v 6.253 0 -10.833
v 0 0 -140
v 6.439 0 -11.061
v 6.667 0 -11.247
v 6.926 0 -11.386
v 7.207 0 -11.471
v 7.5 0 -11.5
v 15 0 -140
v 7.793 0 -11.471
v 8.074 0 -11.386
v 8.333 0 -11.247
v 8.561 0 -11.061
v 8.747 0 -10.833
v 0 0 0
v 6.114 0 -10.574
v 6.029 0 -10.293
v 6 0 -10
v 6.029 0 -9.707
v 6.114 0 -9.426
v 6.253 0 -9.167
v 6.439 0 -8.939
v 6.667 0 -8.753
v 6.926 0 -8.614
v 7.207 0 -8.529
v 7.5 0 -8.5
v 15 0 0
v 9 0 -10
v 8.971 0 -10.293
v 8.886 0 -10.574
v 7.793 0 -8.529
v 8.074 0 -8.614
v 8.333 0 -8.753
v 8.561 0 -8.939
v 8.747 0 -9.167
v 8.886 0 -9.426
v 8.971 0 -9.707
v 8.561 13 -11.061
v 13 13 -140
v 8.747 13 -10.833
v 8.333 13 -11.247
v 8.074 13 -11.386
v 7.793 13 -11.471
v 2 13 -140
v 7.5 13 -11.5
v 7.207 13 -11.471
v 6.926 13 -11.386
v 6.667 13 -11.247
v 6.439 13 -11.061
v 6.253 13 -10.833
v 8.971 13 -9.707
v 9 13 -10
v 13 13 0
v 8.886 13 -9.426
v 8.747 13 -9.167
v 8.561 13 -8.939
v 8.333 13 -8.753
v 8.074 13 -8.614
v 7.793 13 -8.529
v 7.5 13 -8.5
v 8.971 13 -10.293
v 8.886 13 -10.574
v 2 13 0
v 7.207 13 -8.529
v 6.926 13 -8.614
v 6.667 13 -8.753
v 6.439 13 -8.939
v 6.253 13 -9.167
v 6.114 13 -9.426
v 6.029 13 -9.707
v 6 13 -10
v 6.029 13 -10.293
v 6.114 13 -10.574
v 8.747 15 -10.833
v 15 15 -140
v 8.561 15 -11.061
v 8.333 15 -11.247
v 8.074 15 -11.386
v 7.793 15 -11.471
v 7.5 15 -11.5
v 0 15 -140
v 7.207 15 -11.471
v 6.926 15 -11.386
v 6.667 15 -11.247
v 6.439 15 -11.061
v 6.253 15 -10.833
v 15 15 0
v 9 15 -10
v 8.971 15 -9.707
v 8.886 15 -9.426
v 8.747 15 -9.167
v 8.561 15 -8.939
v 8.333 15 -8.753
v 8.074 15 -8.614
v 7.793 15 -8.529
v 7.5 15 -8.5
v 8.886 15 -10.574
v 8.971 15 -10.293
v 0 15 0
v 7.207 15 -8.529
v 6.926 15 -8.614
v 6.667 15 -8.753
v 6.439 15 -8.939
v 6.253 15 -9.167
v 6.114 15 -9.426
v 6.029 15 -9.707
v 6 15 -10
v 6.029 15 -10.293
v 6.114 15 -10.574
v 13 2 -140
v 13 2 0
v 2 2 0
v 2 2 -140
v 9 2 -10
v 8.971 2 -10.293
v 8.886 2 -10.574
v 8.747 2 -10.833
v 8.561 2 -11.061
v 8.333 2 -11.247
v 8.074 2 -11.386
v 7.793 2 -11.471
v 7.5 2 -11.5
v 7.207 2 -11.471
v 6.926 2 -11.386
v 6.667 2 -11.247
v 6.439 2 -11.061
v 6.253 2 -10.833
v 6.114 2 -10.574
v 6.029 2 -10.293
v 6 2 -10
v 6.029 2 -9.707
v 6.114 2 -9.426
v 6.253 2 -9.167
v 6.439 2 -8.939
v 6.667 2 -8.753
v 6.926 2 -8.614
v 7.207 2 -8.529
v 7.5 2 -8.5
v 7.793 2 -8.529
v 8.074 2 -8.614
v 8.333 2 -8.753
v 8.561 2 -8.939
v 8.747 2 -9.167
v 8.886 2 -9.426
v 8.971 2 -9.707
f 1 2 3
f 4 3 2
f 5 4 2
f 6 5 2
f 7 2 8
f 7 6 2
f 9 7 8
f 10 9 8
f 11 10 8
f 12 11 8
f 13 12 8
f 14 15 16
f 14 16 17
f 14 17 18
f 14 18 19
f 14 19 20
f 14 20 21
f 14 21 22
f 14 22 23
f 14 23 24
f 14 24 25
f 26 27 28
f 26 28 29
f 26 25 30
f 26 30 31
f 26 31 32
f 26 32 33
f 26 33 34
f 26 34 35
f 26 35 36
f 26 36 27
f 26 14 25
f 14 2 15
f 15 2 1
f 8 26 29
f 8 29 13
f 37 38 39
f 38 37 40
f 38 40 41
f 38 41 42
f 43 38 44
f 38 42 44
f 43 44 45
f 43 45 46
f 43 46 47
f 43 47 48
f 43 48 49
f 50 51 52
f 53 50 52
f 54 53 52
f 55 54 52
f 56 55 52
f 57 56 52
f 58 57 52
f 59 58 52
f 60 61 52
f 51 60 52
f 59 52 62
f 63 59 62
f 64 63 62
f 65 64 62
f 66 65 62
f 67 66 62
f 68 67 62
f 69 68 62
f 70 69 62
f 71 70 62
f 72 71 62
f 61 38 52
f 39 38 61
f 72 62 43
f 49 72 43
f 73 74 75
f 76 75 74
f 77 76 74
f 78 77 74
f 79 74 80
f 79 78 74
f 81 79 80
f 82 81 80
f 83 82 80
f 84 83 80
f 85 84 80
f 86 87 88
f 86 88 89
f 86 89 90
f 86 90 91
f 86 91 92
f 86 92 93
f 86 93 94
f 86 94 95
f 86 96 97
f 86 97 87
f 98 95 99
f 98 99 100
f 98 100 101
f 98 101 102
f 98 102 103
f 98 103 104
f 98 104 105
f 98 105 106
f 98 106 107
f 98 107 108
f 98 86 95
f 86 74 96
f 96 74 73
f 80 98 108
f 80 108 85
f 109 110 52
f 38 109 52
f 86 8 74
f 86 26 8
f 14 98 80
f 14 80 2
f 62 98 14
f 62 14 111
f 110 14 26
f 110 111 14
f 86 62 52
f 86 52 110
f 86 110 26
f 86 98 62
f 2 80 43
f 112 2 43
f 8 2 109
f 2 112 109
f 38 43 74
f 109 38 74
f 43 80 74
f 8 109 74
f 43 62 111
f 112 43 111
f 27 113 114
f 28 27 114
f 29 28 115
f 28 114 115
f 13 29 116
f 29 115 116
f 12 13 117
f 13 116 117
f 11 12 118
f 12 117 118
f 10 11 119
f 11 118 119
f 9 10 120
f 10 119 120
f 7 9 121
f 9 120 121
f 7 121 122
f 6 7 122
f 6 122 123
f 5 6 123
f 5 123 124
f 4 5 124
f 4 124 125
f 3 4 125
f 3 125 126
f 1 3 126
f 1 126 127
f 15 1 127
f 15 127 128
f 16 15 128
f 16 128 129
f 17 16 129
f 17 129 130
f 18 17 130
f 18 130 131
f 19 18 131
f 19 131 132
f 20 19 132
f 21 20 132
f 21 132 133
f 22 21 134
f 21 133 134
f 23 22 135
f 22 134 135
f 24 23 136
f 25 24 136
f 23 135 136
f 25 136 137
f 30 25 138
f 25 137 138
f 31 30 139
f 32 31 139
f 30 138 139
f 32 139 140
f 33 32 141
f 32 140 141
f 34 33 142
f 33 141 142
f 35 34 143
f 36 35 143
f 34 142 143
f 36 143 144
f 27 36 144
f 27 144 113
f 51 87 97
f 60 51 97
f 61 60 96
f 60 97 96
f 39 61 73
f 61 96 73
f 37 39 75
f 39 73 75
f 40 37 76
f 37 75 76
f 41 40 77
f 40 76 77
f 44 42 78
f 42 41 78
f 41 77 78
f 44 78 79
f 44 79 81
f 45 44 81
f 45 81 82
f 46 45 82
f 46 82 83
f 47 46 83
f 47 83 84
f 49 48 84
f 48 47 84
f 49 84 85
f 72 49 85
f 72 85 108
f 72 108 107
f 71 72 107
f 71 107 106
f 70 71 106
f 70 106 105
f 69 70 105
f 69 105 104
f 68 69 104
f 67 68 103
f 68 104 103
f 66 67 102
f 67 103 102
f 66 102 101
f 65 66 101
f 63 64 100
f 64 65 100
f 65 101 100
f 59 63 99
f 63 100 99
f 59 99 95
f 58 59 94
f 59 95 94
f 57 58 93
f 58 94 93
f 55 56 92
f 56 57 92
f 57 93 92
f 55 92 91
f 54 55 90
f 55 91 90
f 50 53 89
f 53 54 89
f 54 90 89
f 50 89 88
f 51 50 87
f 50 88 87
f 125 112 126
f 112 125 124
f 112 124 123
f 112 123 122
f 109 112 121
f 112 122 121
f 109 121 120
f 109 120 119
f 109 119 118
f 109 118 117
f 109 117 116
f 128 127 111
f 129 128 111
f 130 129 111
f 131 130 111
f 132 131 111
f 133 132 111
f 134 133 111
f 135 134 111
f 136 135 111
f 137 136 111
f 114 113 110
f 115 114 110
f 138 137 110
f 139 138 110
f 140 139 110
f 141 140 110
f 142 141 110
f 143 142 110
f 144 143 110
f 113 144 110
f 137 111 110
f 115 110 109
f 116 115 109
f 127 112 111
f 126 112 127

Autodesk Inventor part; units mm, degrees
ref_plane "YZ Plane" through (0, 0, 0) normal (1, 0, 0) x (0, 1, 0)
ref_plane "XZ Plane" through (0, 0, 0) normal (0, 1, 0) x (-1, 0, 0)
ref_plane "XY Plane" through (0, 0, 0) normal (0, 0, 1) x (1, 0, 0)
sketch "Sketch1" plane through (0, 0, 0) normal (0, 0, 1) x (1, 0, 0)
  line L0 (0, 0) -> (15, 0)
  line L1 (15, 0) -> (15, 15)
  line L2 (15, 15) -> (0, 15)
  line L3 (0, 15) -> (0, 0)
  dimension "d0" = 15
  dimension "d1" = 15
extrude "Extrusion1" add sketch "Sketch1" against normal blind 140
shell "Shell1" thickness 2 removed faces 2 at (10, 5, 0) at (10, 5, -140)
sketch "Sketch2" plane through (0, 15, 0) normal (0, 1, 0) x (1, 0, 0)
  line L0 (2, 0) -> (13, 0) projected
  line L1 (7.5, 0) -> (7.5, 10)
  circle A0 centre (7.5, 10) radius 1.5
  point P0 (0, 0)
  dimension "d5" = 10
  dimension "d6" = 3
extrude "Extrusion2" cut sketch "Sketch2" against normal through all
properties part number "Alumunium Square Tube 14cm"
